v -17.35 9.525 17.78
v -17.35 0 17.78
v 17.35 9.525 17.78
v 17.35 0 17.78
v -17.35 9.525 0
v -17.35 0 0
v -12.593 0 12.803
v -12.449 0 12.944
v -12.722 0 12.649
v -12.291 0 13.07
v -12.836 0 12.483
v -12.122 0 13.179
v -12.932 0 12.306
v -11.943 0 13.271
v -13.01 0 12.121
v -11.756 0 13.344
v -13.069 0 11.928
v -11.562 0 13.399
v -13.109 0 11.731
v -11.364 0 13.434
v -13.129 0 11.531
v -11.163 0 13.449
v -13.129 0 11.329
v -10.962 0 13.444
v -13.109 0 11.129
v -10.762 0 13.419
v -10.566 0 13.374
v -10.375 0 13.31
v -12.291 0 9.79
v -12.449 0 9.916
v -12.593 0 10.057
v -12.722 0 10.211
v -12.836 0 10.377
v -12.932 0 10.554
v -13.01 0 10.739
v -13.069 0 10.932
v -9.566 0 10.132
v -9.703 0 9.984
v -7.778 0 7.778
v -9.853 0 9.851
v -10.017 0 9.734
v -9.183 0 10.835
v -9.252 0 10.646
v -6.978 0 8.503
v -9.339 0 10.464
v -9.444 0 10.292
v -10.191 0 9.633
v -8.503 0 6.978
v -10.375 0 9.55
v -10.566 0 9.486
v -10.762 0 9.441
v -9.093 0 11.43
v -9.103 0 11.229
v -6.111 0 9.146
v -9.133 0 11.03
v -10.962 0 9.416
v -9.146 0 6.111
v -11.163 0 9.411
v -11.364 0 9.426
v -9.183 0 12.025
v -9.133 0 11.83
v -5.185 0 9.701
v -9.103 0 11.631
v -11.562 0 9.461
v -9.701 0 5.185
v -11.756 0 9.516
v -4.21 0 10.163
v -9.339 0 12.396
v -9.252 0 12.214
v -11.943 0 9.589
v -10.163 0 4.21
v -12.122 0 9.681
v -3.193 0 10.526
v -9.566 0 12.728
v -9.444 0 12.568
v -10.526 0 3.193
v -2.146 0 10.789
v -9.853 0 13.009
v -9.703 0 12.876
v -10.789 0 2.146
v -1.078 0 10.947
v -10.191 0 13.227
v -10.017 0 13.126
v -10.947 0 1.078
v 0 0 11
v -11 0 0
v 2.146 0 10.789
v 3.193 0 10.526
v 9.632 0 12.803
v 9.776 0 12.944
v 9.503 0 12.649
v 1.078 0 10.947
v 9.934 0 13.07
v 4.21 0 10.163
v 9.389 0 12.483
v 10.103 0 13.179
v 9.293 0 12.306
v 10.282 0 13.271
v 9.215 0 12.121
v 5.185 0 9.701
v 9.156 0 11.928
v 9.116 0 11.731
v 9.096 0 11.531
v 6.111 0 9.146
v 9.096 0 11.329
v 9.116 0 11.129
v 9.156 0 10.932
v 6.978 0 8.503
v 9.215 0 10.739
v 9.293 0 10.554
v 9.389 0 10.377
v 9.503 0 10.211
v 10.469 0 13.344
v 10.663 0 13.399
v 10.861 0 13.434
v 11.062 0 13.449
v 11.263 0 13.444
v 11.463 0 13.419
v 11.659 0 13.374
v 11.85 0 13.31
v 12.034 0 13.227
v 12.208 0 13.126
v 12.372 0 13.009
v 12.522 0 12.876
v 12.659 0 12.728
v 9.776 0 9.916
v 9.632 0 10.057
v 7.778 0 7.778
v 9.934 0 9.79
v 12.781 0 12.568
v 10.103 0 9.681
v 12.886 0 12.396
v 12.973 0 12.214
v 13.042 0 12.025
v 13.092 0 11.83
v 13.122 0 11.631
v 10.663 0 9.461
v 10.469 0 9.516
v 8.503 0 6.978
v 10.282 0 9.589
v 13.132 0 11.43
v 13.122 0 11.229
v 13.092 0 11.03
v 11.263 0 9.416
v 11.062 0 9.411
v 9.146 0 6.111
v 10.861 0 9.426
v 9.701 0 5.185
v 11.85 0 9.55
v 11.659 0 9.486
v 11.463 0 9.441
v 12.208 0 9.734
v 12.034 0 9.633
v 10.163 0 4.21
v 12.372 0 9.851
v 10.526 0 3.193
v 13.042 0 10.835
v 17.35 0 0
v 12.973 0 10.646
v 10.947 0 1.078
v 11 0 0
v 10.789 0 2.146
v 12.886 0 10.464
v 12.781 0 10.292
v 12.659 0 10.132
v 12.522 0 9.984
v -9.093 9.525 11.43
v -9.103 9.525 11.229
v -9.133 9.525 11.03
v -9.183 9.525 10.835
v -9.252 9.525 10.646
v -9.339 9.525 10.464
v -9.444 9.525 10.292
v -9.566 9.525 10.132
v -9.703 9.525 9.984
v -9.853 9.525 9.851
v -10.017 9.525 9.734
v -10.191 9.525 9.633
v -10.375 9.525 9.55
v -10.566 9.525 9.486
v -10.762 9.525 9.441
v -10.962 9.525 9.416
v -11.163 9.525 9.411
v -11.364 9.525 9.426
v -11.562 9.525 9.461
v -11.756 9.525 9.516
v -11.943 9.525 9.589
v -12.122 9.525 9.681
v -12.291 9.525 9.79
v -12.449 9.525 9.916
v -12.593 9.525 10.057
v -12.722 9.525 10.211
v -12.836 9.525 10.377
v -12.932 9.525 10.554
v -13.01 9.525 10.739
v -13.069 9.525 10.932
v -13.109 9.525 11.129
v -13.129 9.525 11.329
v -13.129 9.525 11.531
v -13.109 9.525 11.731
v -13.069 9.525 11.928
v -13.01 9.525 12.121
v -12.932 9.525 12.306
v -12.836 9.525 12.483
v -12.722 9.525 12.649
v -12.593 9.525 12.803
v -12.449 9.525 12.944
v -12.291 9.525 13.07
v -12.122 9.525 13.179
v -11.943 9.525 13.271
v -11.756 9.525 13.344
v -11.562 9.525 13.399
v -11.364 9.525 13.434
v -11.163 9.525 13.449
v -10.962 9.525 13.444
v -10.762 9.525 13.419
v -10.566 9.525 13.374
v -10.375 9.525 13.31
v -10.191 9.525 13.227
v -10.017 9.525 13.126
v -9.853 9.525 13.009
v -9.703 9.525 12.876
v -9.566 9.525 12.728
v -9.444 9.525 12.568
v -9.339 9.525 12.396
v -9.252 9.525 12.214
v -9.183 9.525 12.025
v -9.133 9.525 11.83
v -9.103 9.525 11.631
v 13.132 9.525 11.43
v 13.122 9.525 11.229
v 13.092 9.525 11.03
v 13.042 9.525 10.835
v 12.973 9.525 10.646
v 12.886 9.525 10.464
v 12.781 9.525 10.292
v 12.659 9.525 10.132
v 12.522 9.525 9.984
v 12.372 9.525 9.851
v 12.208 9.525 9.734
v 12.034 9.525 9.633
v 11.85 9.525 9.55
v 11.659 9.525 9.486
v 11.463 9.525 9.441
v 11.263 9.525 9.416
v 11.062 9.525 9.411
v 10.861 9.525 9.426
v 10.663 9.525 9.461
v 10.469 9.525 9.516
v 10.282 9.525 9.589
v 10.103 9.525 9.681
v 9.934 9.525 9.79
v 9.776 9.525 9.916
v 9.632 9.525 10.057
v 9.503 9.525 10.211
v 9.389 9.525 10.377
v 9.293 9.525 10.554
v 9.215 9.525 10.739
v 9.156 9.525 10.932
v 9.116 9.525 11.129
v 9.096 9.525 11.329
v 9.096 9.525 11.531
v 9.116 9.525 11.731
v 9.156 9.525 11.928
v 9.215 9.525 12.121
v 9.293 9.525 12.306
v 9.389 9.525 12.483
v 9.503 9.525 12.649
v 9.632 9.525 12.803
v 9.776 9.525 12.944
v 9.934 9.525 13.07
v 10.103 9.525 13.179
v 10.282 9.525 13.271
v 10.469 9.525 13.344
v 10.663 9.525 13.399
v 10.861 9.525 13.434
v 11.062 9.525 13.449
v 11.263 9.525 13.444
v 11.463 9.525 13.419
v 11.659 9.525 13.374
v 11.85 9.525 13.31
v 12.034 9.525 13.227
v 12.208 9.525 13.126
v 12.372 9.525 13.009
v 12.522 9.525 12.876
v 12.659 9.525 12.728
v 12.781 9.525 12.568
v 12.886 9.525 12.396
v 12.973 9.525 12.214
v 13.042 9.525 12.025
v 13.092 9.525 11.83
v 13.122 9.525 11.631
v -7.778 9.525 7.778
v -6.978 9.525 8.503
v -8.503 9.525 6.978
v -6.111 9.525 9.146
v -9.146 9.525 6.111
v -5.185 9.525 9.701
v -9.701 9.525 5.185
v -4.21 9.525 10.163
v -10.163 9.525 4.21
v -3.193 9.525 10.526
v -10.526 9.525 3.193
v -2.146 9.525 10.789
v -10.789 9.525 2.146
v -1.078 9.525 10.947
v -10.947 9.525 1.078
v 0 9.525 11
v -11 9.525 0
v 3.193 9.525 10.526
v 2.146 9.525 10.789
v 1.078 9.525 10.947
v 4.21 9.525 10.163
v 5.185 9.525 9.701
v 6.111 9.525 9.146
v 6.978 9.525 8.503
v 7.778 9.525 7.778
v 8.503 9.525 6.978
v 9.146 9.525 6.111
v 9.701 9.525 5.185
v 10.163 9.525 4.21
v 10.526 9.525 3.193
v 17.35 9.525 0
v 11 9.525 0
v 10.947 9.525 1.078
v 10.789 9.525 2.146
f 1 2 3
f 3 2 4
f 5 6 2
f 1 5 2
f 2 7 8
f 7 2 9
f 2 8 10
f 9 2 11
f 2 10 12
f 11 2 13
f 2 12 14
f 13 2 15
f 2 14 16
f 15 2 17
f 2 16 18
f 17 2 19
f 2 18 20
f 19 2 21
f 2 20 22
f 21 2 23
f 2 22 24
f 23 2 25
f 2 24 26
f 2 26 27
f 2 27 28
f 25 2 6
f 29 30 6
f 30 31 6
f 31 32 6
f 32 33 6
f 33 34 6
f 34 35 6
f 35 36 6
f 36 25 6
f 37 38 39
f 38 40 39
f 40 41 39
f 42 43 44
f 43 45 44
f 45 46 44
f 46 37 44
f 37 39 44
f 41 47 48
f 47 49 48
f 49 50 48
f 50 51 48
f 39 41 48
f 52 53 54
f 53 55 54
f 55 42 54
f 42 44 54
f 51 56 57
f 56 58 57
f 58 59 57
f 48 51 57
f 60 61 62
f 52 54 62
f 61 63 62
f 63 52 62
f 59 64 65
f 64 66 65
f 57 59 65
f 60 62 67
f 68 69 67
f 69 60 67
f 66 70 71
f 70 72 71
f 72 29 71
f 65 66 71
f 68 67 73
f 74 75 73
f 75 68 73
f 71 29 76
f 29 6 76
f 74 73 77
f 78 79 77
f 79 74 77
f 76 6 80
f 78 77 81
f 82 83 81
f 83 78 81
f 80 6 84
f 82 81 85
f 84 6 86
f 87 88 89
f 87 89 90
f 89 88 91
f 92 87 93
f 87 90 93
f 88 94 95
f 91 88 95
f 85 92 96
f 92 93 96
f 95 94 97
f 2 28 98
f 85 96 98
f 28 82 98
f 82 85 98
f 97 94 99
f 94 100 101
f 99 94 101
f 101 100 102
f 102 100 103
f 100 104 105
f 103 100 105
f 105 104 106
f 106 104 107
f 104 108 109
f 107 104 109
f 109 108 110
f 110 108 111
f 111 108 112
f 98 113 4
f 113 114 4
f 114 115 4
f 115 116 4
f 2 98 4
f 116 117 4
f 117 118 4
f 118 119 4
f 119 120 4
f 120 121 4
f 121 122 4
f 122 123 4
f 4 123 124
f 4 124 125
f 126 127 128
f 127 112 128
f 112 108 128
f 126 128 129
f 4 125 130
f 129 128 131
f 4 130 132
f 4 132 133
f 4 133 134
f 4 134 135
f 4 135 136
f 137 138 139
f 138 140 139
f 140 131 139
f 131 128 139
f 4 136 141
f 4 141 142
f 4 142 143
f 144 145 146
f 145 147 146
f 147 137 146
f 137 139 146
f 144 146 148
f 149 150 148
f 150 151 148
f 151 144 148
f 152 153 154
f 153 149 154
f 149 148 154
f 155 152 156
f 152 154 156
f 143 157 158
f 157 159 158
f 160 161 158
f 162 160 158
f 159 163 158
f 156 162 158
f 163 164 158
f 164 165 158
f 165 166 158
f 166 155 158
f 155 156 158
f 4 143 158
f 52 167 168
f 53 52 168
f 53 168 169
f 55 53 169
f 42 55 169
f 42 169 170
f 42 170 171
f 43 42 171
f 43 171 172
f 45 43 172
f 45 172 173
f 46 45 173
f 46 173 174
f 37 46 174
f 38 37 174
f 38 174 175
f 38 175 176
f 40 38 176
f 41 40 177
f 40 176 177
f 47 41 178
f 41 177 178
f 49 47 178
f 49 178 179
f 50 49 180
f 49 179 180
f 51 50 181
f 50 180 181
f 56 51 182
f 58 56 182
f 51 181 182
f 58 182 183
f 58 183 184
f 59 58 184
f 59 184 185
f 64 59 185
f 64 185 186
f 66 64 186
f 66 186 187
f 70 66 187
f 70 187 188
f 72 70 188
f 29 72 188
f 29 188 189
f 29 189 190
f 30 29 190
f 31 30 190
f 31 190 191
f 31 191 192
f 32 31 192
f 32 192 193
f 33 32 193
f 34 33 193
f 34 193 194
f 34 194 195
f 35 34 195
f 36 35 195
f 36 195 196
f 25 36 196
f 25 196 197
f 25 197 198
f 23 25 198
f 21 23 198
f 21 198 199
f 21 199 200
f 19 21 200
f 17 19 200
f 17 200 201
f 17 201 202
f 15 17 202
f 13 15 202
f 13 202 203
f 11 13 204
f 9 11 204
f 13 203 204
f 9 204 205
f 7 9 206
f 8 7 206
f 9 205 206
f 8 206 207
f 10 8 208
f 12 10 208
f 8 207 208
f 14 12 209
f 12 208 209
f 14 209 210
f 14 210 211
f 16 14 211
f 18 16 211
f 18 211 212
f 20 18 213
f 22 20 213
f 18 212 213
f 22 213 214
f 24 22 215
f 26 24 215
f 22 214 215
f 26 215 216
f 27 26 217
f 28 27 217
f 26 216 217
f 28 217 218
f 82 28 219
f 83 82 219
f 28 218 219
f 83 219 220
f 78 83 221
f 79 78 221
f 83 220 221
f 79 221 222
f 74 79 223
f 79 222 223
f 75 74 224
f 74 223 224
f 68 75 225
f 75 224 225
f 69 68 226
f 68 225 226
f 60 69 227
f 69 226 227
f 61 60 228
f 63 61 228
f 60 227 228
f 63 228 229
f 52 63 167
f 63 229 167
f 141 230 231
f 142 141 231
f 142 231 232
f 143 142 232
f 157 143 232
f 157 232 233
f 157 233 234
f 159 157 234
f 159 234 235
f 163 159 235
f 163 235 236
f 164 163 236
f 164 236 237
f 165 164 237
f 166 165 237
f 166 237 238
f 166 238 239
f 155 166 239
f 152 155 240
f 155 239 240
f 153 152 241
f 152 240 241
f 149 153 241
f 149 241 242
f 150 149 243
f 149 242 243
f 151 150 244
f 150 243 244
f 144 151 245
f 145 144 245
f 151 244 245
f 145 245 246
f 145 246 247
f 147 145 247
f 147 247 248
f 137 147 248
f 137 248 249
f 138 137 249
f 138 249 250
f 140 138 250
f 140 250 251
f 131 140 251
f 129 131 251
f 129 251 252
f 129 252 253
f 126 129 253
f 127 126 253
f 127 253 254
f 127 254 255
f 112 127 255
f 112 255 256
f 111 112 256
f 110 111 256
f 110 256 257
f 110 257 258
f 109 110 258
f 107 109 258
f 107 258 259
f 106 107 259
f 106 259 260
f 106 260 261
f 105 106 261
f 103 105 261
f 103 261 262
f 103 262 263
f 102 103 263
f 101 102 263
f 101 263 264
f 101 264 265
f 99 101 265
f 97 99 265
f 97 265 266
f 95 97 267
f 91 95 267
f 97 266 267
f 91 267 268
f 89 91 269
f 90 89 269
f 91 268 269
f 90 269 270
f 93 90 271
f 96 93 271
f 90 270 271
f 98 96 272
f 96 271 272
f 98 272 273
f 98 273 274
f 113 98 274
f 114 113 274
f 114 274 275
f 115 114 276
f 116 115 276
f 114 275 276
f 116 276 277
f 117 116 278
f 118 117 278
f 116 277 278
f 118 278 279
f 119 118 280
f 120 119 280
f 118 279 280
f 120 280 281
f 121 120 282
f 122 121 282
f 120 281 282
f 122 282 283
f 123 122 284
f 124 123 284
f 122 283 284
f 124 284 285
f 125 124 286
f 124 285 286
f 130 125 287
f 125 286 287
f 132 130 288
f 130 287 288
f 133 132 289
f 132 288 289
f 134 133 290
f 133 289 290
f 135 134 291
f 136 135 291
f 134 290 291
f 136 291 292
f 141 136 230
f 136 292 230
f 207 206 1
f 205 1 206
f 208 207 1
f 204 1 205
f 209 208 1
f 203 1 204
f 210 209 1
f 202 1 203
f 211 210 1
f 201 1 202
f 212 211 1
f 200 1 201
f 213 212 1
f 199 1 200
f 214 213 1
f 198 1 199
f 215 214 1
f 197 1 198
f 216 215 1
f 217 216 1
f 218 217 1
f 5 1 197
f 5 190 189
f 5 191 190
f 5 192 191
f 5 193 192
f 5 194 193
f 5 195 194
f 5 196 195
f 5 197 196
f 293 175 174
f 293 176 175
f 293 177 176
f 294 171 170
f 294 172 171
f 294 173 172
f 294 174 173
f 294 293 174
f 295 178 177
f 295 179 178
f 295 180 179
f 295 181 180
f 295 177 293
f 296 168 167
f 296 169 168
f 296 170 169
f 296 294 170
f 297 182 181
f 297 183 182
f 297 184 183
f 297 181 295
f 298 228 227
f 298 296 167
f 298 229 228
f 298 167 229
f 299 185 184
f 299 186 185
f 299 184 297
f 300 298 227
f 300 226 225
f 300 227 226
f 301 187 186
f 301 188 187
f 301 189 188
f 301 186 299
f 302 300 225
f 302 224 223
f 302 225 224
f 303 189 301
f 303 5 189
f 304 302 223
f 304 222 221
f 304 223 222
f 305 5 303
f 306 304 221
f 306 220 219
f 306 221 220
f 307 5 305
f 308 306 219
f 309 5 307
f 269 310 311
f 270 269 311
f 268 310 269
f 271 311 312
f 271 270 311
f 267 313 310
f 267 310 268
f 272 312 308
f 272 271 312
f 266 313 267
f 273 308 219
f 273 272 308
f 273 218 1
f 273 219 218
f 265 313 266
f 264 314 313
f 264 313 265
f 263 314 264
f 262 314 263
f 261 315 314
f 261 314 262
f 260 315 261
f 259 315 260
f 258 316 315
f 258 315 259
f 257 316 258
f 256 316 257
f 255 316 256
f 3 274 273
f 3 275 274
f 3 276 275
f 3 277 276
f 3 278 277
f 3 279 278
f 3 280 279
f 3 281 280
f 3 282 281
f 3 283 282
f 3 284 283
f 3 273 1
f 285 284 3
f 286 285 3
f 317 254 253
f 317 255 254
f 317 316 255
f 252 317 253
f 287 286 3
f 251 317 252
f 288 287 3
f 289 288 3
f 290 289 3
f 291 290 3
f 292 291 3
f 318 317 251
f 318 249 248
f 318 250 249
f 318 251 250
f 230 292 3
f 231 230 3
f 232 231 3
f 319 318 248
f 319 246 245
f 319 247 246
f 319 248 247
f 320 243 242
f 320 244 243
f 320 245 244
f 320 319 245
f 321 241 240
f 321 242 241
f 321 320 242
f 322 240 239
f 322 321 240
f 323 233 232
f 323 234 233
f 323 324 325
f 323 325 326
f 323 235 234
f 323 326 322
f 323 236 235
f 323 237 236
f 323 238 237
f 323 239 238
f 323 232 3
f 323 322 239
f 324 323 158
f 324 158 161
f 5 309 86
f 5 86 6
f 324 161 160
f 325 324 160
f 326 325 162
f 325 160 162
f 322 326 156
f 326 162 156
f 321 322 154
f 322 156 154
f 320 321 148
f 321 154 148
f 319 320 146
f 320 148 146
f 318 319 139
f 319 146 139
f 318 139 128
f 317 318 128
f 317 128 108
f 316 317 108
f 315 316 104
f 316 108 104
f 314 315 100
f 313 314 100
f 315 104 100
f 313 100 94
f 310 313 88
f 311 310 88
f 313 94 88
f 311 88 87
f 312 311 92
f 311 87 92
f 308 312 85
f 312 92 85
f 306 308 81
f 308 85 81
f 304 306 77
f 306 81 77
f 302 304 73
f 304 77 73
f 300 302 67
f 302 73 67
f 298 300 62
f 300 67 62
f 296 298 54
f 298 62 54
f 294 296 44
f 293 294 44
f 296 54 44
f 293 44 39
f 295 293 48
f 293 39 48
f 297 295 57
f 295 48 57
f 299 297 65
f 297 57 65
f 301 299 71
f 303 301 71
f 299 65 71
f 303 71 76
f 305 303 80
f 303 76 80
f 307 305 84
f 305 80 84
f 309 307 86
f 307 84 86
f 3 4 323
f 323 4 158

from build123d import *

# Parameters (mm, degrees)
BOSS_EXTRUDE1_DEPTH = 9.525
SKETCH3_R           = 2.0193
CUT_EXTRUDE2_DEPTH  = 10.525


with BuildPart() as part:
    # Sketch1 → Boss-Extrude1 (new body)
    with BuildSketch(Plane(origin=(0, 0, 0), x_dir=(1, 0, 0), z_dir=(0, 1, 0))):
        with BuildLine():
            Line((-10.999999971, -17.78), (10.999999971, -17.78))
            Line((10.999999971, -17.78), (17.349999971, -17.78))
            Line((17.349999971, -17.78), (17.349999971, 0))
            Line((17.349999971, 0), (10.999999971, 0))
            ThreePointArc((10.999999971, 0), (0, -10.999999971), (-10.999999971, 0))
            Line((-10.999999971, 0), (-17.349999971, 0))
            Line((-17.349999971, 0), (-17.349999971, -17.78))
            Line((-17.349999971, -17.78), (-10.999999971, -17.78))
        make_face()
    extrude(amount=BOSS_EXTRUDE1_DEPTH)

    # Sketch3 → Cut-Extrude2 (cut, through all)
    with BuildSketch(Plane(origin=(0, 9.525, 0), x_dir=(1, 0, 0), z_dir=(0, 1, 0))):
        with Locations((11.1125, -11.43)):
            Circle(SKETCH3_R)
        with Locations((-11.1125, -11.43)):
            Circle(SKETCH3_R)
    extrude(amount=-CUT_EXTRUDE2_DEPTH, mode=Mode.SUBTRACT)


solid = part.part
